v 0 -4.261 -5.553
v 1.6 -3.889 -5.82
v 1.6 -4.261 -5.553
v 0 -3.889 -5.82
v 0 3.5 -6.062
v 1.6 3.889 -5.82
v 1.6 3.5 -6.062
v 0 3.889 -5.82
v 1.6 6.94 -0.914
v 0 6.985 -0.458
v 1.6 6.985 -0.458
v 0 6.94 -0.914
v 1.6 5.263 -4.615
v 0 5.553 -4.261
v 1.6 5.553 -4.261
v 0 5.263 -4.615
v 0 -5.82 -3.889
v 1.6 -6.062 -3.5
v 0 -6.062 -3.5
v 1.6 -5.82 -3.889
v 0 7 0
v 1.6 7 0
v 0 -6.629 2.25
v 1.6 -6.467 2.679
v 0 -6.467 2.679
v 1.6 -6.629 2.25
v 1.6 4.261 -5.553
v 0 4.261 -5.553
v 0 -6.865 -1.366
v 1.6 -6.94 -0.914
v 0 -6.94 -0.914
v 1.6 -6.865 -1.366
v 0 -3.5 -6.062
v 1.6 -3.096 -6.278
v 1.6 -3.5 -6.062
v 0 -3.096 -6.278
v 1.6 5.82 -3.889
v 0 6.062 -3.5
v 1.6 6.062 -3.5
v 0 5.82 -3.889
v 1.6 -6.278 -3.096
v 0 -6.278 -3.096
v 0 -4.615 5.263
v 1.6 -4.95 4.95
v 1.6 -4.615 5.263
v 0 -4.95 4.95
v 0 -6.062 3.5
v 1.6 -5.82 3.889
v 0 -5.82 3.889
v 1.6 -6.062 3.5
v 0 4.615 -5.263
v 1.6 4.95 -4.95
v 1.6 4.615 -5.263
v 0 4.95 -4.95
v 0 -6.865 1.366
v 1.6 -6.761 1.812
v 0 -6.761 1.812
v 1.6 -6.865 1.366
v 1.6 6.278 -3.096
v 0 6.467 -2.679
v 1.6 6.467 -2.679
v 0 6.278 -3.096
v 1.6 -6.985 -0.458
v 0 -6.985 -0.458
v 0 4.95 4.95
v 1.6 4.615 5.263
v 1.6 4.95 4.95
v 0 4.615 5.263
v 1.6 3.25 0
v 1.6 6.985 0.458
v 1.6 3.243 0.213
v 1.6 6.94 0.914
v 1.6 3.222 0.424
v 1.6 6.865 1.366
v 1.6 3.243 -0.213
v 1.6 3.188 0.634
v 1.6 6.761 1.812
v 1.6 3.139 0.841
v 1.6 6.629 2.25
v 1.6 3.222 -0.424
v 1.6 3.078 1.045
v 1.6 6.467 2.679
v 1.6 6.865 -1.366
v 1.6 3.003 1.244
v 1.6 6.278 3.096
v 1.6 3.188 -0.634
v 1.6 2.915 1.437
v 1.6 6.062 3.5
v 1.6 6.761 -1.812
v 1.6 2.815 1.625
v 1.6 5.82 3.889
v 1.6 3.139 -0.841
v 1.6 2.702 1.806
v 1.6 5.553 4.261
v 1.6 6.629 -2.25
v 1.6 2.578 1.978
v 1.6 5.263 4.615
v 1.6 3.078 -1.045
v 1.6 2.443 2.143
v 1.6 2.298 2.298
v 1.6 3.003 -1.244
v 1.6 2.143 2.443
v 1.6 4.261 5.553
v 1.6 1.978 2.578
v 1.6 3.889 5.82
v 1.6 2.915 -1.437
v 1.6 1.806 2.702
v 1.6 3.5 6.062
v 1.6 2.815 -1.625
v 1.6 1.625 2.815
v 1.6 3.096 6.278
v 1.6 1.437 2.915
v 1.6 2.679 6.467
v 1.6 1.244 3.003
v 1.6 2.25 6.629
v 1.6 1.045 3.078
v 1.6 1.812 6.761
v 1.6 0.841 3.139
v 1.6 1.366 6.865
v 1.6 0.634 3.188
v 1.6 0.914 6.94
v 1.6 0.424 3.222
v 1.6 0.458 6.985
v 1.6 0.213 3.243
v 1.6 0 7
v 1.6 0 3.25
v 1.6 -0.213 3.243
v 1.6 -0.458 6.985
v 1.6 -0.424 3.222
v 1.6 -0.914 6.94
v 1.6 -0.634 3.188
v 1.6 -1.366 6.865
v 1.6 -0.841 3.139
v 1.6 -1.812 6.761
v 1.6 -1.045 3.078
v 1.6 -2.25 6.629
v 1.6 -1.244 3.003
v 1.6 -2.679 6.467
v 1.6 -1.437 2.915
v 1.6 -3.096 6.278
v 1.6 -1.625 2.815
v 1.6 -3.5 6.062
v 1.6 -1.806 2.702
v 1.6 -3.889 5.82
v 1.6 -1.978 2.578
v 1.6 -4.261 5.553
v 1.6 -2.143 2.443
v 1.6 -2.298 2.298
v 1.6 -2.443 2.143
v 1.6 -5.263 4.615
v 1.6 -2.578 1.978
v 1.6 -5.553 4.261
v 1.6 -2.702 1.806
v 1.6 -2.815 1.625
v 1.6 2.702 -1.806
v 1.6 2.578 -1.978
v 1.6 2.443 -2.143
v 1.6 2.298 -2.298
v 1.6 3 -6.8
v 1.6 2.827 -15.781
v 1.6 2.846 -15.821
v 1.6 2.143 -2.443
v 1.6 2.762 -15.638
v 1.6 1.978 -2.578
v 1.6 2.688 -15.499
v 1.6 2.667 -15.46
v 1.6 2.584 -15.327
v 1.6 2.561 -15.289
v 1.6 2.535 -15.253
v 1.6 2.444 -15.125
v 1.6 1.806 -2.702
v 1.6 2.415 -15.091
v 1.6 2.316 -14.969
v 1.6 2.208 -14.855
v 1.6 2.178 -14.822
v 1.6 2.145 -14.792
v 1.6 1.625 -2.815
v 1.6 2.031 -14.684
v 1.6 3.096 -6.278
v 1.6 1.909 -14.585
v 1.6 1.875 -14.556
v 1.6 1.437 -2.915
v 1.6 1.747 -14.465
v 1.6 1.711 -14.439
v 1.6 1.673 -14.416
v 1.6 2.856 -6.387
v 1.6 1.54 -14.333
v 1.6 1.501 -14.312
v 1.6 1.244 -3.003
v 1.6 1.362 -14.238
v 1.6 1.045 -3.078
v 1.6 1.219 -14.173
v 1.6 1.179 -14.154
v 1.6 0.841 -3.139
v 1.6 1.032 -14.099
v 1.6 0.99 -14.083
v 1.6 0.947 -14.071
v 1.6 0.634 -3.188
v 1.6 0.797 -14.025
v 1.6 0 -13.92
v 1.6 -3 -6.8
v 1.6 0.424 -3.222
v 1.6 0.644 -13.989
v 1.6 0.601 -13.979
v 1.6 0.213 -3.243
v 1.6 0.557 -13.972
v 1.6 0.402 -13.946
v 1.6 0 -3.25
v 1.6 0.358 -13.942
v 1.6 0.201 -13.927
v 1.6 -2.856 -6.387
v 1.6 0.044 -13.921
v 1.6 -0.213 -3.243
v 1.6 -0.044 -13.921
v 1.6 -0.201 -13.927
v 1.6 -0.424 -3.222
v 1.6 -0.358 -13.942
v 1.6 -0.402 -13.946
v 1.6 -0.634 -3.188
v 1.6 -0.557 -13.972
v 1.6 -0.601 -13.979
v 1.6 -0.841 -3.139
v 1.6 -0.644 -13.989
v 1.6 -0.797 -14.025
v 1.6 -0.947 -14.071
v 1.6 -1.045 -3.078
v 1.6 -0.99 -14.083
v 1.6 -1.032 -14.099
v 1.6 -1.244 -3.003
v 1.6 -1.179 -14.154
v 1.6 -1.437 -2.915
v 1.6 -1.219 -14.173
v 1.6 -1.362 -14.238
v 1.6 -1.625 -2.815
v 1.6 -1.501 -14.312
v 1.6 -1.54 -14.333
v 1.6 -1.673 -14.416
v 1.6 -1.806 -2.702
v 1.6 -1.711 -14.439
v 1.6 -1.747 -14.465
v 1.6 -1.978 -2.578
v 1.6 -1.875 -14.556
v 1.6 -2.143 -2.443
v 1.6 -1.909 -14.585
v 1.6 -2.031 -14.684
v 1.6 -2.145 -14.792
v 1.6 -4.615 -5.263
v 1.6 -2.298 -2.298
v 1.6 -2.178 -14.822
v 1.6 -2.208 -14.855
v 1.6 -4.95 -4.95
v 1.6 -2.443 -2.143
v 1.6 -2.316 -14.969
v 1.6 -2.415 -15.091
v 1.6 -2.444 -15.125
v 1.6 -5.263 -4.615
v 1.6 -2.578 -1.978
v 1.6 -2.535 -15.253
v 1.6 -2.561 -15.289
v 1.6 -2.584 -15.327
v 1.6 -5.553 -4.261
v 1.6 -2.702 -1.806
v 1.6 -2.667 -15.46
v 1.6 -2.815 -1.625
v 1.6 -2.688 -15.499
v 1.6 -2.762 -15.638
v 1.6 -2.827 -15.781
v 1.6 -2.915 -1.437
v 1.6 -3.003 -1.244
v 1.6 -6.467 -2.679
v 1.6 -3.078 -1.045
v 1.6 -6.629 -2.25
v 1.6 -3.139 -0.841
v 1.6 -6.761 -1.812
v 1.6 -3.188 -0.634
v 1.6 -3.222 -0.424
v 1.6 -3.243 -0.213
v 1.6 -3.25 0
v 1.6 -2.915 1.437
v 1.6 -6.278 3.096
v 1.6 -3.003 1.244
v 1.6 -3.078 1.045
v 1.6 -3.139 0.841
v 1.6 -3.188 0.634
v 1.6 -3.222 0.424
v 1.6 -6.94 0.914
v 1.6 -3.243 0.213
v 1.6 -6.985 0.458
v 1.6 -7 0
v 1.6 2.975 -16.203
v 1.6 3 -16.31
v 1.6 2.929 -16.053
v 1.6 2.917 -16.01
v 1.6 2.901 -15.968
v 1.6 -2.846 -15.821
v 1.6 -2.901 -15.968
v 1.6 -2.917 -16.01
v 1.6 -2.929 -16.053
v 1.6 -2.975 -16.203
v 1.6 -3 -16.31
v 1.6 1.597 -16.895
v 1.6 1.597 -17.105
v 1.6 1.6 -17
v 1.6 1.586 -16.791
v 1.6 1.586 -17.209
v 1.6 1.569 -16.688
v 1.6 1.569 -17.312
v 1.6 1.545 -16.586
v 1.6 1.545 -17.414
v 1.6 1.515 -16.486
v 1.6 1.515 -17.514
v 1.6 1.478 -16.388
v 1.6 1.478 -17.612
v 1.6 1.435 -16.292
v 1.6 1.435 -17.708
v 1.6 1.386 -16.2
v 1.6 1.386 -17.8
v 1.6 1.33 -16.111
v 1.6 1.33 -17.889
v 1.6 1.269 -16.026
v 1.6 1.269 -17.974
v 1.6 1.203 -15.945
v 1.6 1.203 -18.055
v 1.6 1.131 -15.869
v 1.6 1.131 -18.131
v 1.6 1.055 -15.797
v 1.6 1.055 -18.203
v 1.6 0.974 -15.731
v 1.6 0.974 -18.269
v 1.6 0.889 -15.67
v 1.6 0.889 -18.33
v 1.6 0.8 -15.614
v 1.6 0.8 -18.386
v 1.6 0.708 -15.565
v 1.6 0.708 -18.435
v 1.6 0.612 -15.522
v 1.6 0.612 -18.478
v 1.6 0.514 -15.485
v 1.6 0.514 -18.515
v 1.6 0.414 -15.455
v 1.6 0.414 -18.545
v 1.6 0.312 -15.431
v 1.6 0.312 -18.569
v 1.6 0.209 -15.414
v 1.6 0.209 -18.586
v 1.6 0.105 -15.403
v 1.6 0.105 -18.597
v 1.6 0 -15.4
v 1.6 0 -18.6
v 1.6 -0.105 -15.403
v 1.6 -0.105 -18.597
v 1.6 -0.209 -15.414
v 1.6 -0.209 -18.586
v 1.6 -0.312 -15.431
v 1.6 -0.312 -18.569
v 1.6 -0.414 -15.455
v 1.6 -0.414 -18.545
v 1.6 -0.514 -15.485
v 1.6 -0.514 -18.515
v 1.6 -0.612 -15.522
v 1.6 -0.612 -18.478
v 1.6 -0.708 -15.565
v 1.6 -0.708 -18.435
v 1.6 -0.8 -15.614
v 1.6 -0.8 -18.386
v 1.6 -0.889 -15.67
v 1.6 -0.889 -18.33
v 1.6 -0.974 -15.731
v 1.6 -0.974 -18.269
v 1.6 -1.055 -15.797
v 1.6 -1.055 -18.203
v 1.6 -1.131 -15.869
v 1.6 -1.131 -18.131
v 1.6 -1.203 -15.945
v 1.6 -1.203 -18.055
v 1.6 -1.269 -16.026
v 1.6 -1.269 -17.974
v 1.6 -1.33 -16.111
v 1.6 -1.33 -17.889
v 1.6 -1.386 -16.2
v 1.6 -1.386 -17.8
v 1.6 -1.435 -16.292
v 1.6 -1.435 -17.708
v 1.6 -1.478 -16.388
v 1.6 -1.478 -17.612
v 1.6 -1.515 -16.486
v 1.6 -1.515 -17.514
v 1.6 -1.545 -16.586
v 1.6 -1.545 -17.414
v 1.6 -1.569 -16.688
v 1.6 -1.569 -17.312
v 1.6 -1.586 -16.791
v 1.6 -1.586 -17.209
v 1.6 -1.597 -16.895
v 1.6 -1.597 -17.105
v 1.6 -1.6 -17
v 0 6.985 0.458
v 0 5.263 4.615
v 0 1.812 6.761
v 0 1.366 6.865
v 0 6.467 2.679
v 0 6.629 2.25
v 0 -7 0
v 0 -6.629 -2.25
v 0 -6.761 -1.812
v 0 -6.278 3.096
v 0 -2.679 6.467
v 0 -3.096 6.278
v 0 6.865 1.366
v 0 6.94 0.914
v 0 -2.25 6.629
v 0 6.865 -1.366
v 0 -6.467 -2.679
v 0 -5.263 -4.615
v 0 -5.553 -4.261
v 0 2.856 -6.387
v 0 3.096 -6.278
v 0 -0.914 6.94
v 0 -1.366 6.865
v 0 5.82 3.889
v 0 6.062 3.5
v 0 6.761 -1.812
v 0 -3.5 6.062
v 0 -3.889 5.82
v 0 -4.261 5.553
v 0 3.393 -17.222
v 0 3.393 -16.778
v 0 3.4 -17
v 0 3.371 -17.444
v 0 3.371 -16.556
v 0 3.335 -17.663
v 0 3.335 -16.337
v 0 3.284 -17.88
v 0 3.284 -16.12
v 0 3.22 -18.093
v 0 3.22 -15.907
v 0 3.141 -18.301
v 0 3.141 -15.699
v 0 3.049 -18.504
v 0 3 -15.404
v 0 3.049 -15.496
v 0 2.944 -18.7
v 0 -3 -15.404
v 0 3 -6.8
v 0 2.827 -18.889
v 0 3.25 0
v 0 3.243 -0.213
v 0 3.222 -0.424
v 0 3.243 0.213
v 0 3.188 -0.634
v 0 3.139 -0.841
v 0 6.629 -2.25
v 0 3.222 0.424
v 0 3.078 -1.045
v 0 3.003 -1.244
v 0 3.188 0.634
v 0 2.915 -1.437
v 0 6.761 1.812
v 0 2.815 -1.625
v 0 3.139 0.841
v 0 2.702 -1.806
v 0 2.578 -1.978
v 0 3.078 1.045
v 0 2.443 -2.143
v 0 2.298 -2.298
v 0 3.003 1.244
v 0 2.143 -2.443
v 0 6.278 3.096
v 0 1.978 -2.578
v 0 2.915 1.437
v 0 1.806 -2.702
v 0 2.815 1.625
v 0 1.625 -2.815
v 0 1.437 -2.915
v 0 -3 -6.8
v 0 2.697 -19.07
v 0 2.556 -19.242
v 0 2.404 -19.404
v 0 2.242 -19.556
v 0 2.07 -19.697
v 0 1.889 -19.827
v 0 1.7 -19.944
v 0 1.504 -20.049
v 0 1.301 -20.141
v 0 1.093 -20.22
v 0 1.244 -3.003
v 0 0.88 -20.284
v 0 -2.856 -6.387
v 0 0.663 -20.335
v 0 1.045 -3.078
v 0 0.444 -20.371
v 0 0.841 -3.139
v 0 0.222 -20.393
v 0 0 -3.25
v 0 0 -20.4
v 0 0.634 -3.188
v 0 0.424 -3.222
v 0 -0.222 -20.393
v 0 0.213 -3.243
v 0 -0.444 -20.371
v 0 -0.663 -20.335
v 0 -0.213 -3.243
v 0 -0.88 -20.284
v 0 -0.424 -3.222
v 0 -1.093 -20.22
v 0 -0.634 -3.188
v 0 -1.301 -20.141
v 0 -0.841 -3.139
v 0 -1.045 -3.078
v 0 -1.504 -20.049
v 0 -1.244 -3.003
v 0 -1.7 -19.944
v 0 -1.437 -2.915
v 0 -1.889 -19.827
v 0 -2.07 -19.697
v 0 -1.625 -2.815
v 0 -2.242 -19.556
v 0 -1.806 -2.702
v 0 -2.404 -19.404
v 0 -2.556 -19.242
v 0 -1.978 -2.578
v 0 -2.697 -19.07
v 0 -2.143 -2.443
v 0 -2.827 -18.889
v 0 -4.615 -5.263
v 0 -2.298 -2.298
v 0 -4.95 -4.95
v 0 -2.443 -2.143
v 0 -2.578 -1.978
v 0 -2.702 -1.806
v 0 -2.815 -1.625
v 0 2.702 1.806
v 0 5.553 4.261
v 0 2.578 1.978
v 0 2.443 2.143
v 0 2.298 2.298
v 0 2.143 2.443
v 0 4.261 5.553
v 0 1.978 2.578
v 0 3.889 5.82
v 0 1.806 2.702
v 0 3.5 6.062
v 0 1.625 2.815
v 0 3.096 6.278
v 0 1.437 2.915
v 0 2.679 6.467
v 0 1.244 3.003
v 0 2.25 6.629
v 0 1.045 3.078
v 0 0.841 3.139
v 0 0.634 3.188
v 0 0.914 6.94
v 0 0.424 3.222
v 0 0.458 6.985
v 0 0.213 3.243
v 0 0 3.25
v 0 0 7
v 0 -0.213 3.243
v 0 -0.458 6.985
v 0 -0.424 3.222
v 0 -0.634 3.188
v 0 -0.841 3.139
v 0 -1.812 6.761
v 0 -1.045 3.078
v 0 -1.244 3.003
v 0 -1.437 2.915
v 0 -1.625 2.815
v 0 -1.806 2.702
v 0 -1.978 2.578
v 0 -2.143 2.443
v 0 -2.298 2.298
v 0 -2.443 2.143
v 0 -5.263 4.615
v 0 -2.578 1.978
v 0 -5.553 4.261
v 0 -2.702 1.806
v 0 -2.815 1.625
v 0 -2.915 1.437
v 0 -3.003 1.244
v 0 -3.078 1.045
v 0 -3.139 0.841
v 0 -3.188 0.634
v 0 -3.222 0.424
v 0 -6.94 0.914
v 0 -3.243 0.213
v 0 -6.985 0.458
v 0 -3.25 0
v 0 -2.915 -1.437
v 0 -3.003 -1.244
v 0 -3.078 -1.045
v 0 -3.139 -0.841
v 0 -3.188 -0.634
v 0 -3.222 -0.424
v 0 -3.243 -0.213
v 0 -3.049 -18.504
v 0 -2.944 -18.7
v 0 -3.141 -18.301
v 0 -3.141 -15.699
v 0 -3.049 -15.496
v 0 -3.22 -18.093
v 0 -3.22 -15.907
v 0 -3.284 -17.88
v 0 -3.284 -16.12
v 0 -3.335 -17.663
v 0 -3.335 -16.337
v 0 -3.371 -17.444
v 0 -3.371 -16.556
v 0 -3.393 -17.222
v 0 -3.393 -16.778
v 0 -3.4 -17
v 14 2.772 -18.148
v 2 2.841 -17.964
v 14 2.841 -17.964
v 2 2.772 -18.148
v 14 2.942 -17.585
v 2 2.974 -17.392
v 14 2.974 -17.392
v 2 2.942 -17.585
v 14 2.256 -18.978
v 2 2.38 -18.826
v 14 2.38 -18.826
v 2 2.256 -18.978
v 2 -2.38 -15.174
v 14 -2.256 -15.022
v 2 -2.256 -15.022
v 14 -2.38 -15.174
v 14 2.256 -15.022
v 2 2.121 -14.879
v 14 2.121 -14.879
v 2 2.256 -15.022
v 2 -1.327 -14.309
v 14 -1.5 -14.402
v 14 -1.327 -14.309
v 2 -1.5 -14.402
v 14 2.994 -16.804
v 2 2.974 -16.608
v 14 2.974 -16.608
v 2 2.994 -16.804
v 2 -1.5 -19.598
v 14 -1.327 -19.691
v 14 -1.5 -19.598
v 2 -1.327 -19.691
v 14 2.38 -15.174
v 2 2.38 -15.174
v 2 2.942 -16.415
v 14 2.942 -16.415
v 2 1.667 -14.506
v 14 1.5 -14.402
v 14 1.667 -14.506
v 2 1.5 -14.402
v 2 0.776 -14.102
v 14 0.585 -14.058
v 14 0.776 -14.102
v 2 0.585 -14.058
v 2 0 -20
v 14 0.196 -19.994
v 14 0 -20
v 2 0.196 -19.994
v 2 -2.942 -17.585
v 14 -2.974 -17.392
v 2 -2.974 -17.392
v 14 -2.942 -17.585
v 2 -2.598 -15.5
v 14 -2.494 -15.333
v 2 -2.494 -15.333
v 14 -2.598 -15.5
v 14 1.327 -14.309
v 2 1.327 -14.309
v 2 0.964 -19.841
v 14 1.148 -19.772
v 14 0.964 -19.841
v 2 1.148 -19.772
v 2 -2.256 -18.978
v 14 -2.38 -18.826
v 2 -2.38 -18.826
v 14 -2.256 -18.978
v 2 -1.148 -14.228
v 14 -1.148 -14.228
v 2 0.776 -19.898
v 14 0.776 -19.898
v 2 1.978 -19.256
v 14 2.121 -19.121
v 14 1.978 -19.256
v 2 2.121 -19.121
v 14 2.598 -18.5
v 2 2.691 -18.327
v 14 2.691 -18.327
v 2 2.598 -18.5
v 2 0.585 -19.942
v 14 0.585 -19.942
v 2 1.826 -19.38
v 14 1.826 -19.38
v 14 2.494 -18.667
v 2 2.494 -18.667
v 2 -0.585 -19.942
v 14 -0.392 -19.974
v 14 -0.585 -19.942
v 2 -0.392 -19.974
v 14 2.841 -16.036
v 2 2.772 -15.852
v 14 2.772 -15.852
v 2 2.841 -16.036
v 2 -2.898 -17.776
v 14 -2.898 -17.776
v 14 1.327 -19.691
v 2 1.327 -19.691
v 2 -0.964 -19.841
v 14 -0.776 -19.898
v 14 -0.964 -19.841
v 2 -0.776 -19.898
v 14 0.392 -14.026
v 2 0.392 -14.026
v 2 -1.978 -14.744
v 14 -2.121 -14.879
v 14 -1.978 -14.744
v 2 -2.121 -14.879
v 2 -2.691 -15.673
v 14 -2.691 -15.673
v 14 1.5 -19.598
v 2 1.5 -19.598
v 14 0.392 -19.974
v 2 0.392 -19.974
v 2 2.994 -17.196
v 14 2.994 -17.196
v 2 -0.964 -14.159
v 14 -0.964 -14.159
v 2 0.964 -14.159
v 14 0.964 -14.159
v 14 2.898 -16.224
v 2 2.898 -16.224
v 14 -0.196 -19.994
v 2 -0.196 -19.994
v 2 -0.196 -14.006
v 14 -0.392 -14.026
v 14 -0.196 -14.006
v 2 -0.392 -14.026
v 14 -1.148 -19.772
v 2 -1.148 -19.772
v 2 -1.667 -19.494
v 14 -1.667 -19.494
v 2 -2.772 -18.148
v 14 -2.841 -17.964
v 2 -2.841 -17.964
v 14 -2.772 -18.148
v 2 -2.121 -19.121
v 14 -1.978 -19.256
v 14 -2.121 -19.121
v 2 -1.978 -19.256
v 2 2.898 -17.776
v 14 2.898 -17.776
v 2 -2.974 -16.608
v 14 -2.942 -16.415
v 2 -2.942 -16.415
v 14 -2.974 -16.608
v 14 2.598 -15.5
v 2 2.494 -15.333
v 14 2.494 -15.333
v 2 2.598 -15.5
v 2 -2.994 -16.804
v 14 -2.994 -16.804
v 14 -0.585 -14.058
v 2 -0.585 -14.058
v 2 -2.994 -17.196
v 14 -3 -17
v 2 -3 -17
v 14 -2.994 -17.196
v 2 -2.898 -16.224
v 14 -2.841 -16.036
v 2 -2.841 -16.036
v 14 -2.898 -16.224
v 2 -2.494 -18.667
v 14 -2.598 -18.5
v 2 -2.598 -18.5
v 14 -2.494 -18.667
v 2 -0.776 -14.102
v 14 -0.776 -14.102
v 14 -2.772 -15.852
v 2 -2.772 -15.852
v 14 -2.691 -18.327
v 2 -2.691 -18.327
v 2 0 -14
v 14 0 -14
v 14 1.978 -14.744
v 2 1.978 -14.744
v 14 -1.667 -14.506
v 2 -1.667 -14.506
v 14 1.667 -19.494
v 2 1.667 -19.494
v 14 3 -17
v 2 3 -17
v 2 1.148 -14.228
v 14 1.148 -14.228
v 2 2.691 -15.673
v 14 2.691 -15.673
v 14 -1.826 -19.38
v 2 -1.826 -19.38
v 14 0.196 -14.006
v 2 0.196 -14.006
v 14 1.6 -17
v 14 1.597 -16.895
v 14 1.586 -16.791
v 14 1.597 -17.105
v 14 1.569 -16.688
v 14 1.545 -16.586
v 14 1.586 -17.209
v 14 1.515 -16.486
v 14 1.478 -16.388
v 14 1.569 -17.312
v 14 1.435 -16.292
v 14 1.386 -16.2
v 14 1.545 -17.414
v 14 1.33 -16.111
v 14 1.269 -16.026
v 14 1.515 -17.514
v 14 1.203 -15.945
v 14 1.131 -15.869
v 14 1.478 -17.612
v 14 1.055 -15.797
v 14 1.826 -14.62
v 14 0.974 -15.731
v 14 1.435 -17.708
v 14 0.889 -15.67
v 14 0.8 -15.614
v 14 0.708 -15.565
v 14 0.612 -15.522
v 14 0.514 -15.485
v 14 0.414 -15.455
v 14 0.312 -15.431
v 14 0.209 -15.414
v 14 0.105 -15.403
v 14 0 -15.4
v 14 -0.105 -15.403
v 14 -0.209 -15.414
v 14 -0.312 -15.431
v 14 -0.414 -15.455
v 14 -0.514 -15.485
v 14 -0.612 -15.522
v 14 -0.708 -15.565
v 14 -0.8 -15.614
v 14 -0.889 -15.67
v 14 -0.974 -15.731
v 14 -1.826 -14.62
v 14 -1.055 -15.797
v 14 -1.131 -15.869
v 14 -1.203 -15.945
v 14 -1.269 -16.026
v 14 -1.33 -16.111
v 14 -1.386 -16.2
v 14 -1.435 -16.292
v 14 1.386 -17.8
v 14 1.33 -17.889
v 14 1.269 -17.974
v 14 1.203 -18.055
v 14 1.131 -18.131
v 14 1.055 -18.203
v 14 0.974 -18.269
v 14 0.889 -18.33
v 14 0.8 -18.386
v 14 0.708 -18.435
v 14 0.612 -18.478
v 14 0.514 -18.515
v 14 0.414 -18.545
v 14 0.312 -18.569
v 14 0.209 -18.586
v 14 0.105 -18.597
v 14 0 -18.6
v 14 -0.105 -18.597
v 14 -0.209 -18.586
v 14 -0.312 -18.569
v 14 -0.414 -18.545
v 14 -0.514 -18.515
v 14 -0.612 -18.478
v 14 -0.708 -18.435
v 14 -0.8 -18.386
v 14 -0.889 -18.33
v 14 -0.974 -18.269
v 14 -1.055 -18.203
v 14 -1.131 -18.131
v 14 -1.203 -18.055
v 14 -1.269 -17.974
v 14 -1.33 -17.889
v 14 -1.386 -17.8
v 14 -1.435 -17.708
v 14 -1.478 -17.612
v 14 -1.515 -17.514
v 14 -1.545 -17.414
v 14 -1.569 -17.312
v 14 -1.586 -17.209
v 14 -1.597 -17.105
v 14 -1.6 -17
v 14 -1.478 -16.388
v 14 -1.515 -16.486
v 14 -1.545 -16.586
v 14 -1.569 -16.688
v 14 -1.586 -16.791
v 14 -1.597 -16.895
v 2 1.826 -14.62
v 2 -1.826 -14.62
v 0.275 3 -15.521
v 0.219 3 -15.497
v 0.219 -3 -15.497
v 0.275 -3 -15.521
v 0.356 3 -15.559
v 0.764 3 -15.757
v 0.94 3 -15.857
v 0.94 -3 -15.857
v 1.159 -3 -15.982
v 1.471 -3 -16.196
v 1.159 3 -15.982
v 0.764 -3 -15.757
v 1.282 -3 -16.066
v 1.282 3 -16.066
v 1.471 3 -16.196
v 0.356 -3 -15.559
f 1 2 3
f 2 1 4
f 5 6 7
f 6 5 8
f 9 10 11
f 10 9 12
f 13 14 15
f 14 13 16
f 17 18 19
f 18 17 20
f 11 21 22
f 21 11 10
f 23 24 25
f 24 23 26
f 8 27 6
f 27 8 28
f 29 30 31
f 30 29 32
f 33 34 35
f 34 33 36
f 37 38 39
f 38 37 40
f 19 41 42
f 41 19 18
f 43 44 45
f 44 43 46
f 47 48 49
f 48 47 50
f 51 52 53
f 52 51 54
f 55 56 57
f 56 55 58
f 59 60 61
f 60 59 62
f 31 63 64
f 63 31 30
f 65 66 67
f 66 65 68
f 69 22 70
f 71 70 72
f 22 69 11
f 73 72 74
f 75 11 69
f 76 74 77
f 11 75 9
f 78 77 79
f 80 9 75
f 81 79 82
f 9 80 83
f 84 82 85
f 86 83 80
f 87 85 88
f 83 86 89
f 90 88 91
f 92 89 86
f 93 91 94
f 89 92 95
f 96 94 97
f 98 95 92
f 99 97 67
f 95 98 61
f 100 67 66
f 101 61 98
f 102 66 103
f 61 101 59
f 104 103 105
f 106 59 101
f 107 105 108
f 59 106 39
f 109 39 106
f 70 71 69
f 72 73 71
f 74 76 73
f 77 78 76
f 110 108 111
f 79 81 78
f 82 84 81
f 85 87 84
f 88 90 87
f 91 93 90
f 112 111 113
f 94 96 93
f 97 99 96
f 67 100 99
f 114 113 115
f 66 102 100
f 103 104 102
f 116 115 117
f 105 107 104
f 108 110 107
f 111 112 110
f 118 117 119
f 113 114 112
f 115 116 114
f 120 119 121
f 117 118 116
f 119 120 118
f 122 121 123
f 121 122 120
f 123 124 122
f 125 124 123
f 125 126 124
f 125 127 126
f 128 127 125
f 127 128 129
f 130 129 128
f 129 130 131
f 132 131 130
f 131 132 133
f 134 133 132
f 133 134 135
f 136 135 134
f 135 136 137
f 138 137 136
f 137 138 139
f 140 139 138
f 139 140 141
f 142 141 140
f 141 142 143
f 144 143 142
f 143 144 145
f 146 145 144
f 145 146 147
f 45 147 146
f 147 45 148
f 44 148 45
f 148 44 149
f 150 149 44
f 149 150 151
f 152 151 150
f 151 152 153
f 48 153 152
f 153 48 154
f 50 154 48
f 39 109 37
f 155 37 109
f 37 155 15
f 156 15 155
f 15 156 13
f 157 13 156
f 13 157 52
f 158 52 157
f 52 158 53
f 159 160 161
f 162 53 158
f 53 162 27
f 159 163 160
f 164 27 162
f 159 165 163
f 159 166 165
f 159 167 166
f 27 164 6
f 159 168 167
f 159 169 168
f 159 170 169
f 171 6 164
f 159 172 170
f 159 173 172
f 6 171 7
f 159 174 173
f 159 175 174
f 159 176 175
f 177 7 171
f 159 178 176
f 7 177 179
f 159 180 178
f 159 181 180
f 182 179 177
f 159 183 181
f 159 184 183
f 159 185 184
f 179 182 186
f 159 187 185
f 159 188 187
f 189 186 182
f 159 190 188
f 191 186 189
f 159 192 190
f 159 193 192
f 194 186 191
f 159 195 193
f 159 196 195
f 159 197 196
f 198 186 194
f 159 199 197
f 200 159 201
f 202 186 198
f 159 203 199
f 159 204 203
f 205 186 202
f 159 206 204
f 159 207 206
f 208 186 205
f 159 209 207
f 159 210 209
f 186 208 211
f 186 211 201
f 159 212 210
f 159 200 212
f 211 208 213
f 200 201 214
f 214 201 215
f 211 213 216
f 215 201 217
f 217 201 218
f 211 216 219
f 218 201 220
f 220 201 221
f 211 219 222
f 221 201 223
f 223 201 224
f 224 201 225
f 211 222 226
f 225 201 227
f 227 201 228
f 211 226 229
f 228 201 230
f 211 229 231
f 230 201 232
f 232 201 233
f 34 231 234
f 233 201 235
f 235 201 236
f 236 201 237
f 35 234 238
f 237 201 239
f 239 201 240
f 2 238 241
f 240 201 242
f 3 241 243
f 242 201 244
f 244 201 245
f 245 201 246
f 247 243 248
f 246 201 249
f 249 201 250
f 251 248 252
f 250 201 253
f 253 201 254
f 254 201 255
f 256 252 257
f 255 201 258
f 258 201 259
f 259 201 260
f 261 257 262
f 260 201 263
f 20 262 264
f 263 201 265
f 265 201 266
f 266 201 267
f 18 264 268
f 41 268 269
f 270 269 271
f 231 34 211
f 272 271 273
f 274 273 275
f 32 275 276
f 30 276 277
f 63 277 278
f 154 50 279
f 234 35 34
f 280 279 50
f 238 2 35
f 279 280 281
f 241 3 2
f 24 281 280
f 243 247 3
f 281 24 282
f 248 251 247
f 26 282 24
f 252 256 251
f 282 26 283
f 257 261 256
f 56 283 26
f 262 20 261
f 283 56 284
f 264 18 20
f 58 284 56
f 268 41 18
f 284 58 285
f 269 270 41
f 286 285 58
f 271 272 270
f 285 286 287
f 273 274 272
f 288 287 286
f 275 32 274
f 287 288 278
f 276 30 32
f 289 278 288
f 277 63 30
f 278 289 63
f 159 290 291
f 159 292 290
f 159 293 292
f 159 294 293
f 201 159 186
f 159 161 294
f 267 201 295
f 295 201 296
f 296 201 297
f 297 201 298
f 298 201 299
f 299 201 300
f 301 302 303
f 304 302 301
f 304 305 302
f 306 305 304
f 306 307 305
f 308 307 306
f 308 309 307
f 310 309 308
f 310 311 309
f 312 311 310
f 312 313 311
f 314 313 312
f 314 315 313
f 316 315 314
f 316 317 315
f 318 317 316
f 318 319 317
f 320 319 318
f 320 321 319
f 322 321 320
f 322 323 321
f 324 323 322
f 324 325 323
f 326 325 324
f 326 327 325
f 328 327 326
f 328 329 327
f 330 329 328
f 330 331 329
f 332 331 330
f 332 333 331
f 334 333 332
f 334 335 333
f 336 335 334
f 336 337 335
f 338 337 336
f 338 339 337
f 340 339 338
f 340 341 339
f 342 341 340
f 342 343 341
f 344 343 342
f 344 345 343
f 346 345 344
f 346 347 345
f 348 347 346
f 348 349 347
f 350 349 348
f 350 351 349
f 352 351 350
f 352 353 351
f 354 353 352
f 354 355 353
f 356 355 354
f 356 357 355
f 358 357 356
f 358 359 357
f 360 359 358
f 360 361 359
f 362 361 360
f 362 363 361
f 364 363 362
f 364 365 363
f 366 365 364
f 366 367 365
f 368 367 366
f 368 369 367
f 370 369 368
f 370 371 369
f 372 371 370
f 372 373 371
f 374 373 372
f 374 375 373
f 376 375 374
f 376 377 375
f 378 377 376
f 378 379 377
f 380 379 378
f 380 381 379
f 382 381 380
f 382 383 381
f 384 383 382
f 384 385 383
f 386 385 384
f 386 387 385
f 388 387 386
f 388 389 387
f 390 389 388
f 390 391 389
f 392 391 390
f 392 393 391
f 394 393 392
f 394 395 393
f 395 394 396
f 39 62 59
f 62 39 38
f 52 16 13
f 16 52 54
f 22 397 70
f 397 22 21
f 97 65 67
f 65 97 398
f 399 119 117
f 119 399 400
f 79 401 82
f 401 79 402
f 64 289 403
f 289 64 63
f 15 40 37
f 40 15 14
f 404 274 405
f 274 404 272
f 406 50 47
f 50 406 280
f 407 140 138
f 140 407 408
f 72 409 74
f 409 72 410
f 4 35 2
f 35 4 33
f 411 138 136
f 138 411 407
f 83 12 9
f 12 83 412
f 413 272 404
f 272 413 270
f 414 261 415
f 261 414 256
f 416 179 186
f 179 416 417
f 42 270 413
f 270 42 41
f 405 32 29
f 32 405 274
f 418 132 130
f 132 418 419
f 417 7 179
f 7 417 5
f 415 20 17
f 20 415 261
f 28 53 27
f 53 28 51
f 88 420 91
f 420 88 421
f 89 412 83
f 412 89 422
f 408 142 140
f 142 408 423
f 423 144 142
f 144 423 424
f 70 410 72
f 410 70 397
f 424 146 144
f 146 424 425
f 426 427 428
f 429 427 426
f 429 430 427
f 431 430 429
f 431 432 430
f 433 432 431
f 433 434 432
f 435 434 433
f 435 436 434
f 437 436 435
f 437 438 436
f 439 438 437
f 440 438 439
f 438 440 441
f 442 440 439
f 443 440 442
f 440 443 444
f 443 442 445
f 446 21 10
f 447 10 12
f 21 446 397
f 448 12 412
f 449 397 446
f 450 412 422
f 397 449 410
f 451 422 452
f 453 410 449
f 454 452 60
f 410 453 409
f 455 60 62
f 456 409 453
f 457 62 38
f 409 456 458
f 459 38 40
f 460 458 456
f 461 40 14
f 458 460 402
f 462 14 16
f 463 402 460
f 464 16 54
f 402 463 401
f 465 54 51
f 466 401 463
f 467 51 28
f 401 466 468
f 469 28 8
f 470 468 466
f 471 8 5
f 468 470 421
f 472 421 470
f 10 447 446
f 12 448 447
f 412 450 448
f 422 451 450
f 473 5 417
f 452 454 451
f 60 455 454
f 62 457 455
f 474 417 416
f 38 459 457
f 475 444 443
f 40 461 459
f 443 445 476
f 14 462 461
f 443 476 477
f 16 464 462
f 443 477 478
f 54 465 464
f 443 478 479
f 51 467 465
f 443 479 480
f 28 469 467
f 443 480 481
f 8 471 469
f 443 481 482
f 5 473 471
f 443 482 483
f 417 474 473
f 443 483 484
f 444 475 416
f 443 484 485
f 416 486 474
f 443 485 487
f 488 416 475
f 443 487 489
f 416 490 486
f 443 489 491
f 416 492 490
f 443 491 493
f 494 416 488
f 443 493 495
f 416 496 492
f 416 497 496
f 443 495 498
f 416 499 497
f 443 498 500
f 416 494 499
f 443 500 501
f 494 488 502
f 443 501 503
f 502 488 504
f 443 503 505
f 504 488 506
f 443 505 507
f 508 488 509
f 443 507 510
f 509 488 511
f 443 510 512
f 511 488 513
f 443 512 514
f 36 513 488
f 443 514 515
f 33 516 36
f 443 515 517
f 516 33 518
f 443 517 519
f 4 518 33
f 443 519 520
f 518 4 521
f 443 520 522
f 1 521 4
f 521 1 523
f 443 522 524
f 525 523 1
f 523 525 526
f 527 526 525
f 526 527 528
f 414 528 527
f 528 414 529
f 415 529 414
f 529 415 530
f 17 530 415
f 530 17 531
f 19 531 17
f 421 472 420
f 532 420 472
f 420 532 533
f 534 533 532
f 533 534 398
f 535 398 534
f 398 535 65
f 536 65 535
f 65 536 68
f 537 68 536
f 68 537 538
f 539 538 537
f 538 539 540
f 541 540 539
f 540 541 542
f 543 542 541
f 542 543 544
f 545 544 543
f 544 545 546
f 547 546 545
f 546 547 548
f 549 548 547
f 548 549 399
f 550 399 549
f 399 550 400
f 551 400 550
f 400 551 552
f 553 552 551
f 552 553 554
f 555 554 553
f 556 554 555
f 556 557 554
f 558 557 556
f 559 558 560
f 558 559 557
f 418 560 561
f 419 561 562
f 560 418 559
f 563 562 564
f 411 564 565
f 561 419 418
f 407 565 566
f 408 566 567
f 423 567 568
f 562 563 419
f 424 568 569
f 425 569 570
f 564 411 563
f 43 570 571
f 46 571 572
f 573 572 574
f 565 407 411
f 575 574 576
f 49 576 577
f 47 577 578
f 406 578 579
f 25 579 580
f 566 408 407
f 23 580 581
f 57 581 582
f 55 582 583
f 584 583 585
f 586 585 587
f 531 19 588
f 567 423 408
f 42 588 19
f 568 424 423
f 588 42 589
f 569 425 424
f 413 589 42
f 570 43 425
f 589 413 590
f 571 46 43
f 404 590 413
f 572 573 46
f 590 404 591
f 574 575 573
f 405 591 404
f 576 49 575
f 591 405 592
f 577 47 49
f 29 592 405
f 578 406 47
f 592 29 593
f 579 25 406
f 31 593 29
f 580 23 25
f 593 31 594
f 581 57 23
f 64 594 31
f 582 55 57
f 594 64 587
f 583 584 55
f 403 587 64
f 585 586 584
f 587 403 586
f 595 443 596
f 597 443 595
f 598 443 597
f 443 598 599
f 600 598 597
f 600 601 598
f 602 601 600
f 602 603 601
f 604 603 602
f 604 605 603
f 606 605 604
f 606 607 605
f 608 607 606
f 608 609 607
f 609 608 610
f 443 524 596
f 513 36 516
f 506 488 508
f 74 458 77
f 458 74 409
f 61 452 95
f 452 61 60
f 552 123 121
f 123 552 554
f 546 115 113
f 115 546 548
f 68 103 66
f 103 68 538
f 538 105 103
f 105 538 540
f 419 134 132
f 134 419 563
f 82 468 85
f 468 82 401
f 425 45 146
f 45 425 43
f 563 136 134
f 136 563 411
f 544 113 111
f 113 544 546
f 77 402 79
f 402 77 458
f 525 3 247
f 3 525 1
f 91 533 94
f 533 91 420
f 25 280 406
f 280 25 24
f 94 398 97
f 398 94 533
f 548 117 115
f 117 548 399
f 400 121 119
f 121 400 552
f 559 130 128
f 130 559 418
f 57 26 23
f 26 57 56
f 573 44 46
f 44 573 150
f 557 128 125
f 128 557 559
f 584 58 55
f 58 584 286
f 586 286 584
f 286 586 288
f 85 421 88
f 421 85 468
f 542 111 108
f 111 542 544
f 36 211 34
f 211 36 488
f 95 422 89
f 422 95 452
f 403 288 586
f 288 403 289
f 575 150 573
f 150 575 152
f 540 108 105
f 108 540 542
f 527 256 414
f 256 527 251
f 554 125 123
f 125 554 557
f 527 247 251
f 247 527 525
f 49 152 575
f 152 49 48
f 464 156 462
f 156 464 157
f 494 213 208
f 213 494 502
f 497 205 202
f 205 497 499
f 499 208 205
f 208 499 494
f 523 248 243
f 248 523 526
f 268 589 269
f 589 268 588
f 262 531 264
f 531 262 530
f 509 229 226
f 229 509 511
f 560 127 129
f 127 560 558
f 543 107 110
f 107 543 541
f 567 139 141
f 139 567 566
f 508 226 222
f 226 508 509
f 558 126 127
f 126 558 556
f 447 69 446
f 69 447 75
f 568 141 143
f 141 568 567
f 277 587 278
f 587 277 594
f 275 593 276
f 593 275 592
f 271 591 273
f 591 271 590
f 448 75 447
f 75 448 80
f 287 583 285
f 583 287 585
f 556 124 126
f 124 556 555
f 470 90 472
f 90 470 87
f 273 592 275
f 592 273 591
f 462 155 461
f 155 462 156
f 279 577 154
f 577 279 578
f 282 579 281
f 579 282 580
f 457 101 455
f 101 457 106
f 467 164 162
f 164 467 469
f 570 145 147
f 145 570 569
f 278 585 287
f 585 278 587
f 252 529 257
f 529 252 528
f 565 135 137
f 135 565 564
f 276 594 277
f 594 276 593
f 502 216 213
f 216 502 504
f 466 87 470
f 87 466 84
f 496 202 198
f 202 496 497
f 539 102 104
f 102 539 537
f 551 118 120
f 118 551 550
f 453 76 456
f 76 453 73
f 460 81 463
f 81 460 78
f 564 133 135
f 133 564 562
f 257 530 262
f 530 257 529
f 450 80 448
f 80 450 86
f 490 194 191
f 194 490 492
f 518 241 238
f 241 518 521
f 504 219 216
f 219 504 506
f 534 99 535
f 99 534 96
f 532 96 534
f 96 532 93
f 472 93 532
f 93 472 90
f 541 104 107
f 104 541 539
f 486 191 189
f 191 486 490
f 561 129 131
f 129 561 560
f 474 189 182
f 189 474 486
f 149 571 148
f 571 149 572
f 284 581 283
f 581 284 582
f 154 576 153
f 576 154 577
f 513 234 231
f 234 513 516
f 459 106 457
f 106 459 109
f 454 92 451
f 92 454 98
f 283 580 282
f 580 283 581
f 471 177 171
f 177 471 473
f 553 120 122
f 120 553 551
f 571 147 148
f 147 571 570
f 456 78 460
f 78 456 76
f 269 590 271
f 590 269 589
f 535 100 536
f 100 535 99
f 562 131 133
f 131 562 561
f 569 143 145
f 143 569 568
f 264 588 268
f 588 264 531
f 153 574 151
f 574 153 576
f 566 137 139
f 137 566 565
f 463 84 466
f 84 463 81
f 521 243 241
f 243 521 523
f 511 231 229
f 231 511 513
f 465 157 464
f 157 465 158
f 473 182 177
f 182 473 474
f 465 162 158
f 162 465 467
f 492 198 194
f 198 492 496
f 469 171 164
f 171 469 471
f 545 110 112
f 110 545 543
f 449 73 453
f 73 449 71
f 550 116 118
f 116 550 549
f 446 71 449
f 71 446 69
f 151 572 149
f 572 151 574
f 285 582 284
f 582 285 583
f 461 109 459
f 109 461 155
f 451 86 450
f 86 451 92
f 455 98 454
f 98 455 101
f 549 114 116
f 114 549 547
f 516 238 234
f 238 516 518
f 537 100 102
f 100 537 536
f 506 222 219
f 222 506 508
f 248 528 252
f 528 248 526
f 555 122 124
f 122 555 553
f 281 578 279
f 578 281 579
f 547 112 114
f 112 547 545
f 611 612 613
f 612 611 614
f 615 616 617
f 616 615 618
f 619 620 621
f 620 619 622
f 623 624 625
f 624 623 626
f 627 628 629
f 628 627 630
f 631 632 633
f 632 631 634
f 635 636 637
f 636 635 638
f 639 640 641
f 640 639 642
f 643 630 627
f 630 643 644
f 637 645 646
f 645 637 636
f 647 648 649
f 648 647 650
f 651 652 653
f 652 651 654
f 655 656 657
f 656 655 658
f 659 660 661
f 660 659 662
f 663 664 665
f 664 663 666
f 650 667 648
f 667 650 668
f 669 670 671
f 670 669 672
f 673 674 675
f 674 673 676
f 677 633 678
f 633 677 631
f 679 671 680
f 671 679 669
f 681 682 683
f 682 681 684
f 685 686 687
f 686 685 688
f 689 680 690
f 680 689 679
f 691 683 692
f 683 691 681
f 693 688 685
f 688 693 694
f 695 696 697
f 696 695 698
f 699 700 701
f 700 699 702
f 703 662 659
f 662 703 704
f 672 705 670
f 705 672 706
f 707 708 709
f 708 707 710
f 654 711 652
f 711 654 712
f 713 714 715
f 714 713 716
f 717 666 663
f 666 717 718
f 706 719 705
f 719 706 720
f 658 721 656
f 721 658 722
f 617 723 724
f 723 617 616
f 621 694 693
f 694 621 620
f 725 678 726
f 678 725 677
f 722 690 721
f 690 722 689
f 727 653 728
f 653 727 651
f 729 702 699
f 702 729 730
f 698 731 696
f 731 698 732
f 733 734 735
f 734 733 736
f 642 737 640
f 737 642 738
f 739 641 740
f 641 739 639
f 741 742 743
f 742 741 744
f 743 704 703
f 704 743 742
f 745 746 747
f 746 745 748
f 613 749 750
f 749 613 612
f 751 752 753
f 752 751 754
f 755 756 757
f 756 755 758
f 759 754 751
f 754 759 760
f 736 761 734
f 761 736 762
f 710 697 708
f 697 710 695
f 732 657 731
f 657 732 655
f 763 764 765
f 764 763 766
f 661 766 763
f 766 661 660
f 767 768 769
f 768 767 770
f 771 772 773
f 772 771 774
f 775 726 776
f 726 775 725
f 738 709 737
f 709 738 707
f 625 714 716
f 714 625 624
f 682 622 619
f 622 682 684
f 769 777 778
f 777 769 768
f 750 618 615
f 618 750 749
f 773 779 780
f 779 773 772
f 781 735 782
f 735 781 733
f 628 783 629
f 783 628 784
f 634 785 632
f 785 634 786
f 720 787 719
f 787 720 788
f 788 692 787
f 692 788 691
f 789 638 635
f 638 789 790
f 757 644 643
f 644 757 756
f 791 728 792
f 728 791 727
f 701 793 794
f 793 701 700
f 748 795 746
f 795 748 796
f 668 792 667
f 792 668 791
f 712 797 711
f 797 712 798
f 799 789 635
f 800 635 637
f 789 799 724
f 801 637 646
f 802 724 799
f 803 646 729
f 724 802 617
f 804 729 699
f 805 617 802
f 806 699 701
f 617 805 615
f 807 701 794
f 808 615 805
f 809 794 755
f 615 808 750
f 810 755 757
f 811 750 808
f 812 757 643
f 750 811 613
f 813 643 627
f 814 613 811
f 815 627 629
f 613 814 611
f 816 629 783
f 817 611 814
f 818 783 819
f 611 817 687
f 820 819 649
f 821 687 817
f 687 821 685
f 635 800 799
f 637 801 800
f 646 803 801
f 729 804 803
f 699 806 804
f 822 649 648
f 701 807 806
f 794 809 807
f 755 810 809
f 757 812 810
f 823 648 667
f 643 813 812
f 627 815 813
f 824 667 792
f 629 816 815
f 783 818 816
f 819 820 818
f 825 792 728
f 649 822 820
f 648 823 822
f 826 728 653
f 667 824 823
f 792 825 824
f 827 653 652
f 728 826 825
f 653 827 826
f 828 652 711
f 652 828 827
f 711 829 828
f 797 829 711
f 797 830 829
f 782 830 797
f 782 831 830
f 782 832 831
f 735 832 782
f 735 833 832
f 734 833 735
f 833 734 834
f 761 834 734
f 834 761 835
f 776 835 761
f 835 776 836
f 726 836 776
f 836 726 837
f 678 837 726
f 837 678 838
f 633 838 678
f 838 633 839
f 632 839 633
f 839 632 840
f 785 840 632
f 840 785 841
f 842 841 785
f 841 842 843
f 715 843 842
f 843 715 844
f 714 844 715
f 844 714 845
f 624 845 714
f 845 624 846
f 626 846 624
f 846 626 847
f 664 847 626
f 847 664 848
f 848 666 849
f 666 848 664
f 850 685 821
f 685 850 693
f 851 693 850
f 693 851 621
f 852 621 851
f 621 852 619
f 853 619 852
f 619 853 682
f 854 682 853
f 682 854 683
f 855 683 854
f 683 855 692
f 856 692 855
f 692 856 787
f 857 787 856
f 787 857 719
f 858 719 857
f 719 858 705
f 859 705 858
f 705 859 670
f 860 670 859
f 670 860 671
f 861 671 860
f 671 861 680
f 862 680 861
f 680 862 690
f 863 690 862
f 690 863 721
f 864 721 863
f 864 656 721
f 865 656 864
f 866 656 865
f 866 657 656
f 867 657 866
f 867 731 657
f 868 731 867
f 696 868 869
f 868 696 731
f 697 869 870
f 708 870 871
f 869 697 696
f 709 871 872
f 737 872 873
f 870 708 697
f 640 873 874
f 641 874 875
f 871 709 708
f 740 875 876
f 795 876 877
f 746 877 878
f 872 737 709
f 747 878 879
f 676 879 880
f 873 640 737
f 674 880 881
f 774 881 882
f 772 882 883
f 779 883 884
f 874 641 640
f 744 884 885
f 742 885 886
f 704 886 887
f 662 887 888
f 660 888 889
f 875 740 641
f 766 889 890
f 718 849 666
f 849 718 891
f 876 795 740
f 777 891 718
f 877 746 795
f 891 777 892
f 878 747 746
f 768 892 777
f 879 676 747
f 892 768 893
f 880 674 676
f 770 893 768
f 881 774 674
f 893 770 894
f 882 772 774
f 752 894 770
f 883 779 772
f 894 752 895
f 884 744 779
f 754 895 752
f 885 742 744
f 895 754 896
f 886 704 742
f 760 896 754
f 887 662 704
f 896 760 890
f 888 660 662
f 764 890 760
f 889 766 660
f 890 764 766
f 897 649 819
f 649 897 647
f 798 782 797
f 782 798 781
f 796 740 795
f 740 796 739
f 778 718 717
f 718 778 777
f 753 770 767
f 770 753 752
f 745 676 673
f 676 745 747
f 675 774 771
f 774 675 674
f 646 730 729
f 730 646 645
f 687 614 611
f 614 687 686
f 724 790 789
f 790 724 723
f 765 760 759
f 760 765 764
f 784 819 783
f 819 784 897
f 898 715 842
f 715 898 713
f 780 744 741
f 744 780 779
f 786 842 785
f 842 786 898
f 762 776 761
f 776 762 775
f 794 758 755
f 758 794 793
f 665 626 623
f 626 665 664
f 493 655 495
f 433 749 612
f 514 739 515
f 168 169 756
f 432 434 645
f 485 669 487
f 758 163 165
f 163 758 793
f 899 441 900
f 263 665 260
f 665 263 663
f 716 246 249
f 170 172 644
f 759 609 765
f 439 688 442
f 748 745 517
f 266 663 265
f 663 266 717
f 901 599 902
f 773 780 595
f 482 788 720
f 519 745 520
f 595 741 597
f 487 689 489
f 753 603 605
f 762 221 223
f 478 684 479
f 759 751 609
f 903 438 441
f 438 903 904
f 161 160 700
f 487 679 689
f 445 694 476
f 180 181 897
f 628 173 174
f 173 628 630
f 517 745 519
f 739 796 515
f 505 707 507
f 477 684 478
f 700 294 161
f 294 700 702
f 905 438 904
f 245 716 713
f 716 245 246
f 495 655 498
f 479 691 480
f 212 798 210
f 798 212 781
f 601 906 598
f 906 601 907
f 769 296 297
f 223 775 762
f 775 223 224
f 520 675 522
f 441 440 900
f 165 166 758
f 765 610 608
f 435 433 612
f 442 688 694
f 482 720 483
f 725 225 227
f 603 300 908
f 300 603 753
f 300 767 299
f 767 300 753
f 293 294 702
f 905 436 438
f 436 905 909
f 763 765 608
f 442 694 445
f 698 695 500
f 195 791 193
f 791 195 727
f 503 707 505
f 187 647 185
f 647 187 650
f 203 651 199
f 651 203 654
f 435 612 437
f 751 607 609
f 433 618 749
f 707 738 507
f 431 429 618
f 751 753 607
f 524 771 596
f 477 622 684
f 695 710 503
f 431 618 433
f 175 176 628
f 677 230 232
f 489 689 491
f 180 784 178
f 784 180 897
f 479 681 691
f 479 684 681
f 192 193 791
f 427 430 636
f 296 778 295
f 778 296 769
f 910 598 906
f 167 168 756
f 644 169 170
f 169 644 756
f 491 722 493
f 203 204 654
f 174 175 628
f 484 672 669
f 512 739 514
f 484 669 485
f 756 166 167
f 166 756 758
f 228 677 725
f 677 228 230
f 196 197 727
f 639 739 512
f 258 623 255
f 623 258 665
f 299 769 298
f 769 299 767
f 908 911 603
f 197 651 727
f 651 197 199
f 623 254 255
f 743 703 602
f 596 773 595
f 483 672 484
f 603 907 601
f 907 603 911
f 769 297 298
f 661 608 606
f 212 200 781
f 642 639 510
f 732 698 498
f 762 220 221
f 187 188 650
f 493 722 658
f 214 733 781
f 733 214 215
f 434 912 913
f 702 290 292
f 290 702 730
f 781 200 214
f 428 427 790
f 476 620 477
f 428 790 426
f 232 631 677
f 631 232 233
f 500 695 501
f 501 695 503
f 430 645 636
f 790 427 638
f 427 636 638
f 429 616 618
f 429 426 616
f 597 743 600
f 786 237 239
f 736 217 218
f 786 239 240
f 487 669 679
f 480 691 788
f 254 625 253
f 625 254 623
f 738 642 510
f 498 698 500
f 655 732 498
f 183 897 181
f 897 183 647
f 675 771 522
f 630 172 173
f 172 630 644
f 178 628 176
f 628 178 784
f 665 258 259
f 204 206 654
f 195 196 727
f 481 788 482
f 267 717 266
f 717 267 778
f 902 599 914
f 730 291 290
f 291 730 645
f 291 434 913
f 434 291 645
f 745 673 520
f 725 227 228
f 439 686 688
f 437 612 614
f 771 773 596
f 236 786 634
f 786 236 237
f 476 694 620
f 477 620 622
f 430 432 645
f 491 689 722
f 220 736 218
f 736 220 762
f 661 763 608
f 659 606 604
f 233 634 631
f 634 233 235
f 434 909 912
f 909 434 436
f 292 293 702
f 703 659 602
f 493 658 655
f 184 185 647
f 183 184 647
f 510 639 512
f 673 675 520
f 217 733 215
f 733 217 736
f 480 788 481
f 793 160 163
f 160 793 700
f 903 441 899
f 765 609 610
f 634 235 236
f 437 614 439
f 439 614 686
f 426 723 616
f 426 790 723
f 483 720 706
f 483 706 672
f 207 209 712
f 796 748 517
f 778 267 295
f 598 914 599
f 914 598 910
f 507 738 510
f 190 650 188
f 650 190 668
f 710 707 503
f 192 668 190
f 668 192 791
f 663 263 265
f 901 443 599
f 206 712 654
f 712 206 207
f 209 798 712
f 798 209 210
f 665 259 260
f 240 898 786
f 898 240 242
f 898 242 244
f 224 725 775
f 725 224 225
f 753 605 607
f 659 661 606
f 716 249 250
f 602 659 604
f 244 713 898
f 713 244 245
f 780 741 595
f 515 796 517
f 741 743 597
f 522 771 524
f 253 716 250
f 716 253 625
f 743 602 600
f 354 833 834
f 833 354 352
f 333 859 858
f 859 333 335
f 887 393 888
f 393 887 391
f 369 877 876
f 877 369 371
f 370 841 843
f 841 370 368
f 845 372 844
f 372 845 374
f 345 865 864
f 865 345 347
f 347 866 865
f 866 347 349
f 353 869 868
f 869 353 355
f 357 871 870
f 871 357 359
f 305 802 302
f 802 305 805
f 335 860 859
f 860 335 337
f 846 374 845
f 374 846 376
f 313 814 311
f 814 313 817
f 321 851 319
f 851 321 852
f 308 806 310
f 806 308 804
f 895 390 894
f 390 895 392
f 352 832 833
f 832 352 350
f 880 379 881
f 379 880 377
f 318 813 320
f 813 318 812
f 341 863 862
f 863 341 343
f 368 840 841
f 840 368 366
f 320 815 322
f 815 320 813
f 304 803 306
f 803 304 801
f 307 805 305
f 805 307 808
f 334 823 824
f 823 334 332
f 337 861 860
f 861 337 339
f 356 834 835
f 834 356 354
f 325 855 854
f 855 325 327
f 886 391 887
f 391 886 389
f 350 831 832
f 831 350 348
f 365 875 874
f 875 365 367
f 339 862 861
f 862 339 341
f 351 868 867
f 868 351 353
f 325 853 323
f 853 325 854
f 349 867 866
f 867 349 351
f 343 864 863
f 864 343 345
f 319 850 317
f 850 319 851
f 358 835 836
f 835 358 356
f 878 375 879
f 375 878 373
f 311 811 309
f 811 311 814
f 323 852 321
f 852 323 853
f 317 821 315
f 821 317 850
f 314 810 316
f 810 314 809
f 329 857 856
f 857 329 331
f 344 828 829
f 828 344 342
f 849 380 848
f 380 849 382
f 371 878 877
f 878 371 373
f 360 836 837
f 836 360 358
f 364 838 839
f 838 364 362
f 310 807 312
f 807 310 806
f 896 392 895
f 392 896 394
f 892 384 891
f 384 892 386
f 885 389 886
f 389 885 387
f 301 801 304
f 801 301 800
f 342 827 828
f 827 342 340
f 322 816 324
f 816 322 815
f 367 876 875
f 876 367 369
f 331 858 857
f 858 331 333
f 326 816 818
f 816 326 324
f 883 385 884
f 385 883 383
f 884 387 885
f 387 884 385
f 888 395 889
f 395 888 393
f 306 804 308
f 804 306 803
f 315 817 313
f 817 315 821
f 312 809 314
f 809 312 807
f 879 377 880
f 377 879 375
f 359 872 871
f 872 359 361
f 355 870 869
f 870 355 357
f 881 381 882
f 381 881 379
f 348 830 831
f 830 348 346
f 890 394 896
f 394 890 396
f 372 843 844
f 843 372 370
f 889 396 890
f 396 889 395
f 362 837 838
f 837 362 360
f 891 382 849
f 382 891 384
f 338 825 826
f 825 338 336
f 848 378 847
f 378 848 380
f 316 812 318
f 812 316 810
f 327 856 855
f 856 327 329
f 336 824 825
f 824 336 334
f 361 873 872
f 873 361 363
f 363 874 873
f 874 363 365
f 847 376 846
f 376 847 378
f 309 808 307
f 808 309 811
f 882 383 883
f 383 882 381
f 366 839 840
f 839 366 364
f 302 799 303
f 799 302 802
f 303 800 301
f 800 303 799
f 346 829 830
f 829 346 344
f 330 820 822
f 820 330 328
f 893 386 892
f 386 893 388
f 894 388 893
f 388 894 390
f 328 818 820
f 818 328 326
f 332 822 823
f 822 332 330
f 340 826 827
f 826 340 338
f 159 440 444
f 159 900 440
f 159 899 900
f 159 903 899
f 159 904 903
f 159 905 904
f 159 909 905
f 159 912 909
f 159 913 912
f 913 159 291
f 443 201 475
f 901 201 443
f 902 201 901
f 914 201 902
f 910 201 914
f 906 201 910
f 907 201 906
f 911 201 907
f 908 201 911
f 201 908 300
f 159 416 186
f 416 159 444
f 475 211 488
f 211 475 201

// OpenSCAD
$fn=96;

// Ring terminal parameters (mm)
ring_od        = 14;   // outer diameter of ring
ring_id        = 6.5;  // inner hole diameter
ring_thickness = 1.6;  // thickness (Z)

neck_len       = 10;   // length from ring to barrel
neck_w         = 6.0;  // width of neck
neck_thickness = 1.6;  // thickness (Z)

barrel_len     = 14;   // length of crimp barrel
barrel_od      = 6.0;  // outer diameter of barrel
barrel_id      = 3.2;  // wire hole diameter

flare_len      = 2.0;  // small flare at barrel entry
flare_od       = 6.8;  // flare outer diameter

// Small fillet-like rounding via hull between primitives
module ring_terminal() {
    union() {
        // Ring (washer)
        difference() {
            cylinder(h=ring_thickness, d=ring_od);
            translate([0,0,-0.2]) cylinder(h=ring_thickness+0.4, d=ring_id);
        }

        // Neck (flat strap) blended to ring and barrel
        translate([0,0,0]) hull() {
            // Strap block
            translate([ring_od/2 - 0.2, -neck_w/2, 0])
                cube([neck_len, neck_w, neck_thickness]);

            // Small pad on ring edge to blend
            translate([ring_od/2 - 0.6, 0, ring_thickness/2])
                cylinder(h=neck_thickness, d=neck_w*0.9, center=true);

            // Small pad near barrel start to blend
            translate([ring_od/2 + neck_len - 0.6, 0, neck_thickness/2])
                cylinder(h=neck_thickness, d=barrel_od*0.95, center=true);
        }

        // Barrel (crimp tube) with through-hole
        translate([ring_od/2 + neck_len, 0, 0])
        difference() {
            union() {
                // Main barrel
                cylinder(h=barrel_len, d=barrel_od);

                // Entry flare
                translate([0,0,0])
                    cylinder(h=flare_len, d1=flare_od, d2=barrel_od);
            }
            // Wire hole
            translate([0,0,-0.2]) cylinder(h=barrel_len+0.4, d=barrel_id);
        }
    }
}

// Orient so ring lies in XY plane, barrel extends in +X
// Current construction has barrel along +Z; rotate to +X.
rotate([0,90,0]) ring_terminal();
